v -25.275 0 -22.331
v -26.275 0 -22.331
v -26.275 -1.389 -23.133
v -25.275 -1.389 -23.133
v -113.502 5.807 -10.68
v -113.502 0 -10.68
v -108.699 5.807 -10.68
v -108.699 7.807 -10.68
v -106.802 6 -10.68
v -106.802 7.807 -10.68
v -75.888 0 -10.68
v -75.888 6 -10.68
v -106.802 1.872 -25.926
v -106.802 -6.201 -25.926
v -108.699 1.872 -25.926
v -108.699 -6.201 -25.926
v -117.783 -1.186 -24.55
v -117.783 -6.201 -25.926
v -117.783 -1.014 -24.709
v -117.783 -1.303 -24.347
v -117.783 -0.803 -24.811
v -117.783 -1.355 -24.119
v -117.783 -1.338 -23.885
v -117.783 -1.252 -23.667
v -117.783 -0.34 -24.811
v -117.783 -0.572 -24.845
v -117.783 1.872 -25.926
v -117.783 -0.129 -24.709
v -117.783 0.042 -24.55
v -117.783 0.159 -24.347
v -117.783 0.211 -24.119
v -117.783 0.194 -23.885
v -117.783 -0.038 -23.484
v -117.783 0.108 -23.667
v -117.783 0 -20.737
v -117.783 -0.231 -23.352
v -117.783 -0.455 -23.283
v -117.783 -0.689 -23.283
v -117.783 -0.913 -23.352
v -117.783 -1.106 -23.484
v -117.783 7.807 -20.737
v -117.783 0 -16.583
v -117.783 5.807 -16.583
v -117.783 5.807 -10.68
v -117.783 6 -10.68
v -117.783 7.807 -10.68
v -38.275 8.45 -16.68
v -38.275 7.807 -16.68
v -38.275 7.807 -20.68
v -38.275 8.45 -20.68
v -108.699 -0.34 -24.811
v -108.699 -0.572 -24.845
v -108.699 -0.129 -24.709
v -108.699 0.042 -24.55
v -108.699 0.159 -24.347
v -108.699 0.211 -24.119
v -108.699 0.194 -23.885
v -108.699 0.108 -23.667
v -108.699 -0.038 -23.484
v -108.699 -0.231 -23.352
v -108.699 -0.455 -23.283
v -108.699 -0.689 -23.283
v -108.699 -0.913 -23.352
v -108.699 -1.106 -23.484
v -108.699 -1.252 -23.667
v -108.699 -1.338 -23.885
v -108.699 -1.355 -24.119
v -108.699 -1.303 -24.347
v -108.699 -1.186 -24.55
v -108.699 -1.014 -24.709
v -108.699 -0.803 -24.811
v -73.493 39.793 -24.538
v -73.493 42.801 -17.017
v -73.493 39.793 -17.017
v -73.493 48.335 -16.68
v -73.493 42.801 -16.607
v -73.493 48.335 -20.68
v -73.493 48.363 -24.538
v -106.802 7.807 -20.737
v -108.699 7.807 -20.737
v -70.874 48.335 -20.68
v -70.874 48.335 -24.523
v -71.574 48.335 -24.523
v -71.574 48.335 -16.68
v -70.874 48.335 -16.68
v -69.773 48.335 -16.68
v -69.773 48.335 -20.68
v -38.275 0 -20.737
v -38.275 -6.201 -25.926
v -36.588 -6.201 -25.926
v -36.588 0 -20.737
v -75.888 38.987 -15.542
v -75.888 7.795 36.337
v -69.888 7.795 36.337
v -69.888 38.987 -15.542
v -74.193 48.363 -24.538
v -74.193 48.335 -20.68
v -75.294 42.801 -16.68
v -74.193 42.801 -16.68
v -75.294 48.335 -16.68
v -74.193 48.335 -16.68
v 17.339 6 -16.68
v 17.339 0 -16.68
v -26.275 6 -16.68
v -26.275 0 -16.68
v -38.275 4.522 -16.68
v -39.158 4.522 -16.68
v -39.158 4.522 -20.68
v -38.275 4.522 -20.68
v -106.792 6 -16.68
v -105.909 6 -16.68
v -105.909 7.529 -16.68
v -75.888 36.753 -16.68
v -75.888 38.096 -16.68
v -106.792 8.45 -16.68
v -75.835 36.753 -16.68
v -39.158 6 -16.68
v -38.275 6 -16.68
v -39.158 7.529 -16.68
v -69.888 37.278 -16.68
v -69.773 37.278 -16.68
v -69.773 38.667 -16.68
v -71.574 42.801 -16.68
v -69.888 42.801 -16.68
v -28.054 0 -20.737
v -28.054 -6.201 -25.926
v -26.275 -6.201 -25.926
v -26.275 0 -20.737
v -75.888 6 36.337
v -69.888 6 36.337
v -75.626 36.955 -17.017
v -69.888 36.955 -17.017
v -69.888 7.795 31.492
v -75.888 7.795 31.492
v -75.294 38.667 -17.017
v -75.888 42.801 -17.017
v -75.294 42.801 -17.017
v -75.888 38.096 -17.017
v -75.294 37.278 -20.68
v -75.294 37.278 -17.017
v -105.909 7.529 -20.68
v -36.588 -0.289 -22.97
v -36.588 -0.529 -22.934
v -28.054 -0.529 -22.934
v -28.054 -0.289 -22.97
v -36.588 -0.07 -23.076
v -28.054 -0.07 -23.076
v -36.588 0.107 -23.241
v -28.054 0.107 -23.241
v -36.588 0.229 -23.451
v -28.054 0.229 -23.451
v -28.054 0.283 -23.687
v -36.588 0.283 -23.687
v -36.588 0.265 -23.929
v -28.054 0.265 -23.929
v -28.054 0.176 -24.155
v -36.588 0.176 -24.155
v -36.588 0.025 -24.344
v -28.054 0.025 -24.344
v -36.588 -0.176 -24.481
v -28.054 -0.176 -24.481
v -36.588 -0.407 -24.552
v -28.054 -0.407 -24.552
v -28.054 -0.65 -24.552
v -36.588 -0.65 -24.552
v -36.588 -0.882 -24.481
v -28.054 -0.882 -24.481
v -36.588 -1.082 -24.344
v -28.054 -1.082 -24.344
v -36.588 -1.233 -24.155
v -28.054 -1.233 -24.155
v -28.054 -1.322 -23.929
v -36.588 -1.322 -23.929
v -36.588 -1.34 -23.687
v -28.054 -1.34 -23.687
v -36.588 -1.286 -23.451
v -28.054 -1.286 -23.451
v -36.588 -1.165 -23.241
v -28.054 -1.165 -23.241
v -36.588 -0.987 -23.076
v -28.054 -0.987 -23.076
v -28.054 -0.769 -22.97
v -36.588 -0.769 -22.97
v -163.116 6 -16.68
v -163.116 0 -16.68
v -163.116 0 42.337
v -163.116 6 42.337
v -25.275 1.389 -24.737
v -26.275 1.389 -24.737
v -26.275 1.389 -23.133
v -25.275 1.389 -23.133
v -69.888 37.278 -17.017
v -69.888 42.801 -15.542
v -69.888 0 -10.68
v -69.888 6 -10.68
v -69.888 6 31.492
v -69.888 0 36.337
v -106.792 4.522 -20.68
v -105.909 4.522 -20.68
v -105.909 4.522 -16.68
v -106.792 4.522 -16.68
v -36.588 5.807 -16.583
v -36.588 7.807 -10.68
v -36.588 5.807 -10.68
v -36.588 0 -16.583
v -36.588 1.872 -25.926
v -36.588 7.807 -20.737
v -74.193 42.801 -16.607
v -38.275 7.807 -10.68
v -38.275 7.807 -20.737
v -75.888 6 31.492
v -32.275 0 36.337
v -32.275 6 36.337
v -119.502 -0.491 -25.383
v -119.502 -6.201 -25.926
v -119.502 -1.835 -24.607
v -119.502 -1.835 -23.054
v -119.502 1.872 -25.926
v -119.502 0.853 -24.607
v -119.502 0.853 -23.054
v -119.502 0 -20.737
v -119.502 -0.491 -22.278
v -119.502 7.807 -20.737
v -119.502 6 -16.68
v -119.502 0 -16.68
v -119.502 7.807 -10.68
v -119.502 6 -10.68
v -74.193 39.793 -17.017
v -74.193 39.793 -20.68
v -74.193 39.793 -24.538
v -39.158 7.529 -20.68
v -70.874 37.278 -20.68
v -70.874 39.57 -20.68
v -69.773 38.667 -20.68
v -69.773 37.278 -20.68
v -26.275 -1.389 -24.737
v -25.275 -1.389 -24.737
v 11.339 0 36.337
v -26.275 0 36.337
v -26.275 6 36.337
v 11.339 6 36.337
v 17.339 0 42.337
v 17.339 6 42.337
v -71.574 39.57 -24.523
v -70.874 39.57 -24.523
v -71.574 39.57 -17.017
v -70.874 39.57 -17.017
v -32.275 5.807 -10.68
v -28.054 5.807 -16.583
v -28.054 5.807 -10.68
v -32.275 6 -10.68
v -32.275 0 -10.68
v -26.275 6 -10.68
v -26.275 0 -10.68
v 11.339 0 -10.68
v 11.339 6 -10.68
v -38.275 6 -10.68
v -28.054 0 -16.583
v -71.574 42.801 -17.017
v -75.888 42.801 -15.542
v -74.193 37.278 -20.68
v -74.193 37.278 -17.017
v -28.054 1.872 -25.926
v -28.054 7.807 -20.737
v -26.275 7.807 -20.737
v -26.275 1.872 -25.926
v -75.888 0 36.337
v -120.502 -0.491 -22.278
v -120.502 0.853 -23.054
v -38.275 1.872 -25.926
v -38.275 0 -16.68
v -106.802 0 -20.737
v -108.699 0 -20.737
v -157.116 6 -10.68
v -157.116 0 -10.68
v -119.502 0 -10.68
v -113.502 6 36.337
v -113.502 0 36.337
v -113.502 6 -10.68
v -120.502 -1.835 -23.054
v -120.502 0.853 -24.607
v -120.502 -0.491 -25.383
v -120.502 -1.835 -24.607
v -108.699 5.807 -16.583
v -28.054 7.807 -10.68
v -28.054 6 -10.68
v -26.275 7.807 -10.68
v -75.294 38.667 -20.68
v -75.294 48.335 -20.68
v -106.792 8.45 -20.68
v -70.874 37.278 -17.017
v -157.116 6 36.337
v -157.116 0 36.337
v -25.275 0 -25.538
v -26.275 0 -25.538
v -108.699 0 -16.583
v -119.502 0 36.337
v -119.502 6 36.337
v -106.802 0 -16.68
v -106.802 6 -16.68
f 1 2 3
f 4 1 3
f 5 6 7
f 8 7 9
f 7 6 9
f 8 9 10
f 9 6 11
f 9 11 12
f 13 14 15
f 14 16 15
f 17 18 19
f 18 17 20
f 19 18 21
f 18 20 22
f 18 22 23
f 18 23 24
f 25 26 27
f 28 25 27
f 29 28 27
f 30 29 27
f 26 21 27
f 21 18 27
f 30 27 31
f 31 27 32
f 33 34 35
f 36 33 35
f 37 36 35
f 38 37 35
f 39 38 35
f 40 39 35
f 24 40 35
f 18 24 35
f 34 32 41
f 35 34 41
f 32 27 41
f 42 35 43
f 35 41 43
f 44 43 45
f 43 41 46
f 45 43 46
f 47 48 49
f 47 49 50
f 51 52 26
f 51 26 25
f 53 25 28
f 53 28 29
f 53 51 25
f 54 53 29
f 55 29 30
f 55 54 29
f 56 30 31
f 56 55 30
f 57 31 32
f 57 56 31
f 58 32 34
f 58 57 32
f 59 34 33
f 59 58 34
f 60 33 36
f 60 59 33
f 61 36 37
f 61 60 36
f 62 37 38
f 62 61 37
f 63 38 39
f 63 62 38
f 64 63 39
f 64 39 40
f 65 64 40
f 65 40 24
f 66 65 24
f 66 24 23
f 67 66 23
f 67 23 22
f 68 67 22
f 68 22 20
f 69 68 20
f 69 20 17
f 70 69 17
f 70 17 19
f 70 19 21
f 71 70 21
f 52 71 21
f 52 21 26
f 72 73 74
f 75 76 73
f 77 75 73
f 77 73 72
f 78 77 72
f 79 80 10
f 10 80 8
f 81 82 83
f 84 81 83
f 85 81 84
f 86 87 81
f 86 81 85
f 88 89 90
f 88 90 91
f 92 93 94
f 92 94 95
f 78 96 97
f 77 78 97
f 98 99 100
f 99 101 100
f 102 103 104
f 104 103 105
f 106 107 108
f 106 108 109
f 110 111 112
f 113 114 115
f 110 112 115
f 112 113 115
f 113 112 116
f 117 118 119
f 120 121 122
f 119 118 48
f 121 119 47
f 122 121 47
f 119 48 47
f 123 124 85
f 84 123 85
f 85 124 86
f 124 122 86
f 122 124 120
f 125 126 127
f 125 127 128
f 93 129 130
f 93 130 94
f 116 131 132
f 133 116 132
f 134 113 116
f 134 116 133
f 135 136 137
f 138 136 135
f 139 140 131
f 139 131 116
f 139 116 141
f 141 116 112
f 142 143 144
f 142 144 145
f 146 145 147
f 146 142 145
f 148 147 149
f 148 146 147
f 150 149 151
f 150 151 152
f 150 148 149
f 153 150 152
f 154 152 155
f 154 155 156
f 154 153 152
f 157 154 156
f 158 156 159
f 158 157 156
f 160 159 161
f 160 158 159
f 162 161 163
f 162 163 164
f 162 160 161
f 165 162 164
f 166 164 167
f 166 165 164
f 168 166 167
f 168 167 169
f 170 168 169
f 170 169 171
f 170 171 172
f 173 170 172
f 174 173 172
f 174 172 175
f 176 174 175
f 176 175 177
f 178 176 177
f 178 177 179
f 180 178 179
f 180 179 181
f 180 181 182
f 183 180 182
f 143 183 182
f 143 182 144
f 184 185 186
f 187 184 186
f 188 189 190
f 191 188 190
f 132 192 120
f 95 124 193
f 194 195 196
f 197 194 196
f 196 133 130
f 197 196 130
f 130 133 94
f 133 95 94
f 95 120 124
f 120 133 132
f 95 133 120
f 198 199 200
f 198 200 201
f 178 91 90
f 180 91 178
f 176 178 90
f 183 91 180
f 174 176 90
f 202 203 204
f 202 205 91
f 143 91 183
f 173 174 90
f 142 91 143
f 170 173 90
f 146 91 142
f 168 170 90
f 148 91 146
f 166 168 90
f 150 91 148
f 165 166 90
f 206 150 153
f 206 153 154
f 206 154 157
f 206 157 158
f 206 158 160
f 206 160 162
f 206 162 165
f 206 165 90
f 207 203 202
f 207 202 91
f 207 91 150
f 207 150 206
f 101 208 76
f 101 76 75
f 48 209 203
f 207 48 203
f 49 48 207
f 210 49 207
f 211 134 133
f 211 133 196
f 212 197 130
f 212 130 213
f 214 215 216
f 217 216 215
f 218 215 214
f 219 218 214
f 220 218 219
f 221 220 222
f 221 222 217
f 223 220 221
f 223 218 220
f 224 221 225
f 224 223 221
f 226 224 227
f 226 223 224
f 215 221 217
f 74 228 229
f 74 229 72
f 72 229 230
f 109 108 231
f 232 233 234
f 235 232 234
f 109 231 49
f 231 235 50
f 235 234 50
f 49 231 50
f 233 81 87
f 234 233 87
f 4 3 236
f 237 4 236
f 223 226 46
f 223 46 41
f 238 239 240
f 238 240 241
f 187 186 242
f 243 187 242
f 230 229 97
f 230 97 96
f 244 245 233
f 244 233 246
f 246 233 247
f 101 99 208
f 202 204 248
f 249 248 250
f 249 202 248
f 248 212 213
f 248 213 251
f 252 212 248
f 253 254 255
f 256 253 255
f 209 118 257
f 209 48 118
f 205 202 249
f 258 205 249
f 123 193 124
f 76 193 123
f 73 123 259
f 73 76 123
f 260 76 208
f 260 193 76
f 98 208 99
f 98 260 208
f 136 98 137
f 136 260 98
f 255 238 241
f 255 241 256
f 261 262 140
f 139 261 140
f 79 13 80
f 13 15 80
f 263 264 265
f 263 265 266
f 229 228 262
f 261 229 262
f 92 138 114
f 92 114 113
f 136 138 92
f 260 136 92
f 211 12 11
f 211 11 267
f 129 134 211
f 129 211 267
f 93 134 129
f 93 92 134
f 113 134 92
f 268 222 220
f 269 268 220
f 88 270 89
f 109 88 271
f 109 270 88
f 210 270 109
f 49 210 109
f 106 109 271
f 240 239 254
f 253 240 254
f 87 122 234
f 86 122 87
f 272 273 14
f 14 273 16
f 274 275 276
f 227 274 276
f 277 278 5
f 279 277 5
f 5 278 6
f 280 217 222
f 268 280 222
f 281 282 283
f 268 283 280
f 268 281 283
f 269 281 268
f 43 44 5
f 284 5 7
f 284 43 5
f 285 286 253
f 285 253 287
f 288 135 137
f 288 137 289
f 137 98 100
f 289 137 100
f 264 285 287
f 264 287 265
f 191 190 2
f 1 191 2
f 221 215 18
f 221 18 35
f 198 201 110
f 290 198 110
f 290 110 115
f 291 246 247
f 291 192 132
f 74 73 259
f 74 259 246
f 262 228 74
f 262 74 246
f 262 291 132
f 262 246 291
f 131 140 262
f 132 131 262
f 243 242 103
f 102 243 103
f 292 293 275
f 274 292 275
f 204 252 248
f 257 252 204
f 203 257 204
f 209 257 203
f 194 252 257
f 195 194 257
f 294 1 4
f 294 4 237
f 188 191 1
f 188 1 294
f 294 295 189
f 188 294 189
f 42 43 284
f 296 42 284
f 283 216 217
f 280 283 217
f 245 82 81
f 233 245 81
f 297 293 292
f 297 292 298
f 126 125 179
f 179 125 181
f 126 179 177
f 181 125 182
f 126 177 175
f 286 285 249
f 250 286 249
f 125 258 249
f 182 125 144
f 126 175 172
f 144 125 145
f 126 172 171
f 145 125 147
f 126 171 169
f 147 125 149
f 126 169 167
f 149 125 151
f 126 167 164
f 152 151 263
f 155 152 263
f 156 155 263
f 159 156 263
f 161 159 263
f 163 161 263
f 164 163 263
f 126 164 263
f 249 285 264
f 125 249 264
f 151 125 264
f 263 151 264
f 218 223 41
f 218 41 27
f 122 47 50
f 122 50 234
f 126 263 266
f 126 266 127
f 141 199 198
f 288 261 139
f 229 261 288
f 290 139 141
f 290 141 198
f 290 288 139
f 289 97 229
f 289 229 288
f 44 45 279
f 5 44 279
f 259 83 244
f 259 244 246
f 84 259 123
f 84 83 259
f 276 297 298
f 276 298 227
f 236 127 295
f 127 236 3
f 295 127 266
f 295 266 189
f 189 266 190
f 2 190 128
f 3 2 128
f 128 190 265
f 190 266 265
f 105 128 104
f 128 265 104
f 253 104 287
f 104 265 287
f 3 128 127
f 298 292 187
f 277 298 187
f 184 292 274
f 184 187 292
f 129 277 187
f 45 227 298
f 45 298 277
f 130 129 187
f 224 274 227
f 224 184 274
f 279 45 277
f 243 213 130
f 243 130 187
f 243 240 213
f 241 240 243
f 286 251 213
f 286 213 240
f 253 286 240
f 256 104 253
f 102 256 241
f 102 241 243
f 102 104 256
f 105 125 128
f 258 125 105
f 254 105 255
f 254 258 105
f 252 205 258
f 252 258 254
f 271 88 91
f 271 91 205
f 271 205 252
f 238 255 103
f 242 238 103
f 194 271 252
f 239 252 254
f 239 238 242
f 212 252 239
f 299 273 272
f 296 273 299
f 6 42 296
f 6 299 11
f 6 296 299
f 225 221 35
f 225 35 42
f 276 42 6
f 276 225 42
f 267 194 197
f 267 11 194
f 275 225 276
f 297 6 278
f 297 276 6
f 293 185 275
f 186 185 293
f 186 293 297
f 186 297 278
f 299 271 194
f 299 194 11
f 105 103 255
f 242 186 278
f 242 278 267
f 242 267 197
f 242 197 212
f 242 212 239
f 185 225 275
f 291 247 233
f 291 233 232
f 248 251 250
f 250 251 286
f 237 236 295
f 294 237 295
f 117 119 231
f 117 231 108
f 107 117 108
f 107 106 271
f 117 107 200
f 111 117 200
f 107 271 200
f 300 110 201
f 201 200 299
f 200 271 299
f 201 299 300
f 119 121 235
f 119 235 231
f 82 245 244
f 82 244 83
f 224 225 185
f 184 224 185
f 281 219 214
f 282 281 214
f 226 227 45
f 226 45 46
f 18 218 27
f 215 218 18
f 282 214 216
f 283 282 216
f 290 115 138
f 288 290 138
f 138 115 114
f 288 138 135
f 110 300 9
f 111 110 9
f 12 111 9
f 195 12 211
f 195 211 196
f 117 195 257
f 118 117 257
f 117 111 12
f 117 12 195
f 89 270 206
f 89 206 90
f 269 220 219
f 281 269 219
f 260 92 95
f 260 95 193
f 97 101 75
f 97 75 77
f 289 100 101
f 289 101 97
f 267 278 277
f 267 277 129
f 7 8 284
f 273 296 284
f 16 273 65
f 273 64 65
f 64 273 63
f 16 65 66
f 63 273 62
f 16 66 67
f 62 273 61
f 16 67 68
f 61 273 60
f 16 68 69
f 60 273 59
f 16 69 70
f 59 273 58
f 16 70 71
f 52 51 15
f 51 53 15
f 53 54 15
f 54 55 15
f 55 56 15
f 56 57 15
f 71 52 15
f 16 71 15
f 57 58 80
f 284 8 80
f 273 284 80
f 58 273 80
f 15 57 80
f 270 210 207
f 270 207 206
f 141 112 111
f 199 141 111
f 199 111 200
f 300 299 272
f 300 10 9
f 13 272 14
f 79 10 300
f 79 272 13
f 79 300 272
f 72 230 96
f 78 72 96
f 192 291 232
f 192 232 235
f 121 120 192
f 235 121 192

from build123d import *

# Parameters (mm, degrees)
SKETCH1_W            = 37.613618603
SKETCH1_H            = 47.017023253
SKETCH1_W_2          = 37.613618602
BOSS_EXTRUDE1_DEPTH  = 6
BOSS_EXTRUDE2_DEPTH  = 6
MIRROR3_COPY_1_DEPTH = 6
SKETCH6_W            = 8.533488923
SKETCH6_H            = 15.820834786
CUT_EXTRUDE2_DEPTH   = 2
SKETCH7_W            = 8.533488923
SKETCH7_H            = 10.900786406
CUT_EXTRUDE3_DEPTH   = 16
BOSS_EXTRUDE6_DEPTH  = 4
SKETCH9_W            = 9.784219632
SKETCH9_H            = 16.89117049
CUT_EXTRUDE4_DEPTH   = 2
SKETCH10_W           = 9.784219632
SKETCH10_H           = 11.02968992
CUT_EXTRUDE5_DEPTH   = 15
BOSS_EXTRUDE8_DEPTH  = 0.7
BOSS_EXTRUDE9_DEPTH  = 0.7
SKETCH15_W           = 7.842146402
SKETCH15_H           = 8.765171011
BOSS_EXTRUDE11_DEPTH = 0.7
BOSS_EXTRUDE12_DEPTH = 0.7
BOSS_EXTRUDE13_DEPTH = 0.7
BOSS_EXTRUDE15_DEPTH = 6
BOSS_EXTRUDE16_DEPTH = 1
SKETCH25_R           = 0.785617121
BOSS_EXTRUDE17_DEPTH = 13
BOSS_EXTRUDE18_DEPTH = 1
SKETCH27_R           = 0.813635411
BOSS_EXTRUDE19_DEPTH = 12


with BuildPart() as part:
    # Sketch1 → Boss-Extrude1 (new body)
    with BuildSketch(Plane(origin=(0, 0, 0), x_dir=(1, 0, 0), z_dir=(0, 1, 0))):
        Polygon((-163.115635978, 16.680412456), (-163.115635978, -40.614150466), (-163.115635978, -42.336610797), (17.338838432, -42.336610797), (17.338838432, 16.680412456), (16.48228959, 16.680412456), align=None)
        with Locations((-138.308826677, -12.82809917)):
            Rectangle(SKETCH1_W, SKETCH1_H, mode=Mode.SUBTRACT)
        with Locations((-94.695208074, -12.82809917)):
            Rectangle(SKETCH1_W_2, SKETCH1_H, mode=Mode.SUBTRACT)
        with Locations((-51.081589472, -12.82809917)):
            Rectangle(SKETCH1_W, SKETCH1_H, mode=Mode.SUBTRACT)
        with Locations((-7.467970869, -12.82809917)):
            Rectangle(SKETCH1_W_2, SKETCH1_H, mode=Mode.SUBTRACT)
    extrude(amount=BOSS_EXTRUDE1_DEPTH)

    # Sketch2 → Boss-Extrude2 (add)
    with BuildSketch(Plane.ZY.offset(119.502017375)):
        Polygon((-10.680412456, 6), (-10.680412456, 7.806965874), (-20.737358395, 7.806965874), (-25.925828115, 1.87209116), (-25.925828115, -3.073895358), (-25.925828115, -6.20063921), (-20.737358395, 0), (-16.680412456, 0), (-10.680412456, 0), align=None)
    boss_extrude2 = extrude(amount=-BOSS_EXTRUDE2_DEPTH)

    # Mirror2: Boss-Extrude2 across plane
    add(boss_extrude2.mirror(Plane(origin=(-75.888398773, 6, -10.680412456), x_dir=(0, 0, 1), z_dir=(-1, 0, 0))))

    # Mirror3 copy 1 sketch → Mirror3 copy 1 (add)
    with BuildSketch(Plane.ZY.offset(32.27478017)):
        Polygon((-10.680412456, 6), (-10.680412456, 7.806965874), (-20.737358395, 7.806965874), (-25.925828115, 1.87209116), (-25.925828115, -3.073895358), (-25.925828115, -6.20063921), (-20.737358395, 0), (-16.680412456, 0), (-10.680412456, 0), align=None)
    extrude(amount=-MIRROR3_COPY_1_DEPTH)

    # Mirror4: Boss-Extrude2 across plane
    add(boss_extrude2.mirror(Plane.ZY.offset(113.502017375)))

    # Sketch6 → Cut-Extrude2 (cut)
    with BuildSketch(Plane(origin=(0, 7.806965874, 0), x_dir=(1, 0, 0), z_dir=(0, 1, 0))):
        with Locations((-32.321100626, 18.590829849)):
            Rectangle(SKETCH6_W, SKETCH6_H)
    extrude(amount=-CUT_EXTRUDE2_DEPTH, mode=Mode.SUBTRACT)

    # Sketch7 → Cut-Extrude3 (cut)
    with BuildSketch(Plane(origin=(0, 5.806965874, 0), x_dir=(1, 0, 0), z_dir=(0, 1, 0))):
        with Locations((-32.321100626, 22.033512706)):
            Rectangle(SKETCH7_W, SKETCH7_H)
    extrude(amount=-CUT_EXTRUDE3_DEPTH, mode=Mode.SUBTRACT)

    # Sketch8 → Boss-Extrude6 (add)
    with BuildSketch(Plane(origin=(0, 0, -16.680412456), x_dir=(-1, 0, 0), z_dir=(0, 0, -1))):
        Polygon((38.27478017, 4.522273807), (38.27478017, 8.450147148), (69.772707479, 38.666586062), (69.772707479, 48.334730149), (70.874011488, 48.334730149), (70.874011488, 37.278255422), (69.772707479, 37.278255422), (39.158061482, 7.529405606), (39.158061482, 4.522273807), align=None)
    boss_extrude6 = extrude(amount=BOSS_EXTRUDE6_DEPTH)

    # Sketch9 → Cut-Extrude4 (cut)
    with BuildSketch(Plane(origin=(0, 7.806965874, 0), x_dir=(1, 0, 0), z_dir=(0, 1, 0))):
        with Locations((-113.591226463, 19.125997701)):
            Rectangle(SKETCH9_W, SKETCH9_H)
    extrude(amount=-CUT_EXTRUDE4_DEPTH, mode=Mode.SUBTRACT)

    # Sketch10 → Cut-Extrude5 (cut)
    with BuildSketch(Plane(origin=(0, 5.806965874, 0), x_dir=(1, 0, 0), z_dir=(0, 1, 0))):
        with Locations((-113.591226463, 22.097964463)):
            Rectangle(SKETCH10_W, SKETCH10_H)
    extrude(amount=-CUT_EXTRUDE5_DEPTH, mode=Mode.SUBTRACT)

    # Mirror7: Boss-Extrude6 across plane
    add(boss_extrude6.mirror(Plane(origin=(-72.533385445, 0, 0), x_dir=(0, 0, 1), z_dir=(1, 0, 0))))

    # Sketch12 → Boss-Extrude8 (add)
    with BuildSketch(Plane(origin=(-107.502017375, 0, 0), x_dir=(0, 0, -1), z_dir=(1, 0, 0))):
        Polygon((16.680412456, 6), (16.680412456, 0), (20.737358395, 0), (25.925828115, -6.20063921), (25.925828115, 1.87209116), (20.737358395, 7.806965874), (10.680412456, 7.806965874), (10.680412456, 6), align=None)
    extrude(amount=BOSS_EXTRUDE8_DEPTH)

    # Sketch14 → Boss-Extrude9 (add)
    with BuildSketch(Plane(origin=(-118.483336279, 0, 0), x_dir=(0, 0, -1), z_dir=(1, 0, 0))):
        Polygon((16.583119503, 0), (16.583119503, 5.806965874), (10.680412456, 5.806965874), (10.680412456, 7.806965874), (20.737358395, 7.806965874), (25.925828115, 1.87209116), (25.925828115, -6.20063921), (20.737358395, 0), align=None)
    extrude(amount=BOSS_EXTRUDE9_DEPTH)

    # Sketch15 → Boss-Extrude11 (add)
    with BuildSketch(Plane.ZY.offset(70.874011488)):
        with Locations((-20.601485657, 43.952144644)):
            Rectangle(SKETCH15_W, SKETCH15_H)
    extrude(amount=BOSS_EXTRUDE11_DEPTH)

    # Sketch19 → Boss-Extrude12 (add)
    with BuildSketch(Plane(origin=(-74.192759403, 0, 0), x_dir=(0, 0, -1), z_dir=(1, 0, 0))):
        Polygon((20.680412456, 48.334730149), (20.754843595, 39.792896823), (16.566782326, 39.792896823), (16.680412456, 48.334730149), align=None)
    extrude(amount=BOSS_EXTRUDE12_DEPTH)

    # Sketch21 → Boss-Extrude13 (add)
    with BuildSketch(Plane(origin=(-74.192759403, 0, 0), x_dir=(0, 0, -1), z_dir=(1, 0, 0))):
        Polygon((20.754843595, 39.792896823), (24.537534544, 39.792896823), (24.537534544, 48.362951427), (20.680412456, 48.334730149), align=None)
    extrude(amount=BOSS_EXTRUDE13_DEPTH)

    # Sketch23 → Boss-Extrude15 (add)
    with BuildSketch(Plane.ZY.offset(75.888398773)):
        Polygon((36.336610797, 6), (36.336610797, 7.794899668), (-15.54173244, 38.987033262), (-15.54173244, 42.801373137), (-17.017265085, 42.801373137), (-17.017265085, 38.335404827), (-17.017265085, 36.955229626), (31.491887766, 7.794899668), (31.491887766, 4.688712486), (36.336610797, 4.688712486), align=None)
    extrude(amount=-BOSS_EXTRUDE15_DEPTH)

    # Sketch24 → Boss-Extrude16 (add)
    with BuildSketch(Plane.ZY.offset(119.502017375)):
        Polygon((-22.278203382, -0.491017032), (-23.054410428, 0.85341301), (-24.606824521, 0.85341301), (-25.383031568, -0.491017032), (-24.606824521, -1.835447074), (-23.054410428, -1.835447074), align=None)
    extrude(amount=BOSS_EXTRUDE16_DEPTH)

    # Sketch25 → Boss-Extrude17 (add)
    with BuildSketch(Plane(origin=(-106.802017375, 0, 0), x_dir=(0, 0, -1), z_dir=(1, 0, 0))):
        with Locations((24.059849536, -0.571927467)):
            Circle(SKETCH25_R)
    extrude(amount=-BOSS_EXTRUDE17_DEPTH)

    # Sketch26 → Boss-Extrude18 (add)
    with BuildSketch(Plane(origin=(-26.27478017, 0, 0), x_dir=(0, 0, -1), z_dir=(1, 0, 0))):
        Polygon((25.53835309, 0), (24.736565321, 1.388737154), (23.132989782, 1.388737154), (22.331202013, 0), (23.132989782, -1.388737154), (24.736565321, -1.388737154), align=None)
    extrude(amount=BOSS_EXTRUDE18_DEPTH)

    # Sketch27 → Boss-Extrude19 (add)
    with BuildSketch(Plane.ZY.offset(38.27478017)):
        with Locations((-23.747895792, -0.52869674)):
            Circle(SKETCH27_R)
    extrude(amount=-BOSS_EXTRUDE19_DEPTH)


solid = part.part
